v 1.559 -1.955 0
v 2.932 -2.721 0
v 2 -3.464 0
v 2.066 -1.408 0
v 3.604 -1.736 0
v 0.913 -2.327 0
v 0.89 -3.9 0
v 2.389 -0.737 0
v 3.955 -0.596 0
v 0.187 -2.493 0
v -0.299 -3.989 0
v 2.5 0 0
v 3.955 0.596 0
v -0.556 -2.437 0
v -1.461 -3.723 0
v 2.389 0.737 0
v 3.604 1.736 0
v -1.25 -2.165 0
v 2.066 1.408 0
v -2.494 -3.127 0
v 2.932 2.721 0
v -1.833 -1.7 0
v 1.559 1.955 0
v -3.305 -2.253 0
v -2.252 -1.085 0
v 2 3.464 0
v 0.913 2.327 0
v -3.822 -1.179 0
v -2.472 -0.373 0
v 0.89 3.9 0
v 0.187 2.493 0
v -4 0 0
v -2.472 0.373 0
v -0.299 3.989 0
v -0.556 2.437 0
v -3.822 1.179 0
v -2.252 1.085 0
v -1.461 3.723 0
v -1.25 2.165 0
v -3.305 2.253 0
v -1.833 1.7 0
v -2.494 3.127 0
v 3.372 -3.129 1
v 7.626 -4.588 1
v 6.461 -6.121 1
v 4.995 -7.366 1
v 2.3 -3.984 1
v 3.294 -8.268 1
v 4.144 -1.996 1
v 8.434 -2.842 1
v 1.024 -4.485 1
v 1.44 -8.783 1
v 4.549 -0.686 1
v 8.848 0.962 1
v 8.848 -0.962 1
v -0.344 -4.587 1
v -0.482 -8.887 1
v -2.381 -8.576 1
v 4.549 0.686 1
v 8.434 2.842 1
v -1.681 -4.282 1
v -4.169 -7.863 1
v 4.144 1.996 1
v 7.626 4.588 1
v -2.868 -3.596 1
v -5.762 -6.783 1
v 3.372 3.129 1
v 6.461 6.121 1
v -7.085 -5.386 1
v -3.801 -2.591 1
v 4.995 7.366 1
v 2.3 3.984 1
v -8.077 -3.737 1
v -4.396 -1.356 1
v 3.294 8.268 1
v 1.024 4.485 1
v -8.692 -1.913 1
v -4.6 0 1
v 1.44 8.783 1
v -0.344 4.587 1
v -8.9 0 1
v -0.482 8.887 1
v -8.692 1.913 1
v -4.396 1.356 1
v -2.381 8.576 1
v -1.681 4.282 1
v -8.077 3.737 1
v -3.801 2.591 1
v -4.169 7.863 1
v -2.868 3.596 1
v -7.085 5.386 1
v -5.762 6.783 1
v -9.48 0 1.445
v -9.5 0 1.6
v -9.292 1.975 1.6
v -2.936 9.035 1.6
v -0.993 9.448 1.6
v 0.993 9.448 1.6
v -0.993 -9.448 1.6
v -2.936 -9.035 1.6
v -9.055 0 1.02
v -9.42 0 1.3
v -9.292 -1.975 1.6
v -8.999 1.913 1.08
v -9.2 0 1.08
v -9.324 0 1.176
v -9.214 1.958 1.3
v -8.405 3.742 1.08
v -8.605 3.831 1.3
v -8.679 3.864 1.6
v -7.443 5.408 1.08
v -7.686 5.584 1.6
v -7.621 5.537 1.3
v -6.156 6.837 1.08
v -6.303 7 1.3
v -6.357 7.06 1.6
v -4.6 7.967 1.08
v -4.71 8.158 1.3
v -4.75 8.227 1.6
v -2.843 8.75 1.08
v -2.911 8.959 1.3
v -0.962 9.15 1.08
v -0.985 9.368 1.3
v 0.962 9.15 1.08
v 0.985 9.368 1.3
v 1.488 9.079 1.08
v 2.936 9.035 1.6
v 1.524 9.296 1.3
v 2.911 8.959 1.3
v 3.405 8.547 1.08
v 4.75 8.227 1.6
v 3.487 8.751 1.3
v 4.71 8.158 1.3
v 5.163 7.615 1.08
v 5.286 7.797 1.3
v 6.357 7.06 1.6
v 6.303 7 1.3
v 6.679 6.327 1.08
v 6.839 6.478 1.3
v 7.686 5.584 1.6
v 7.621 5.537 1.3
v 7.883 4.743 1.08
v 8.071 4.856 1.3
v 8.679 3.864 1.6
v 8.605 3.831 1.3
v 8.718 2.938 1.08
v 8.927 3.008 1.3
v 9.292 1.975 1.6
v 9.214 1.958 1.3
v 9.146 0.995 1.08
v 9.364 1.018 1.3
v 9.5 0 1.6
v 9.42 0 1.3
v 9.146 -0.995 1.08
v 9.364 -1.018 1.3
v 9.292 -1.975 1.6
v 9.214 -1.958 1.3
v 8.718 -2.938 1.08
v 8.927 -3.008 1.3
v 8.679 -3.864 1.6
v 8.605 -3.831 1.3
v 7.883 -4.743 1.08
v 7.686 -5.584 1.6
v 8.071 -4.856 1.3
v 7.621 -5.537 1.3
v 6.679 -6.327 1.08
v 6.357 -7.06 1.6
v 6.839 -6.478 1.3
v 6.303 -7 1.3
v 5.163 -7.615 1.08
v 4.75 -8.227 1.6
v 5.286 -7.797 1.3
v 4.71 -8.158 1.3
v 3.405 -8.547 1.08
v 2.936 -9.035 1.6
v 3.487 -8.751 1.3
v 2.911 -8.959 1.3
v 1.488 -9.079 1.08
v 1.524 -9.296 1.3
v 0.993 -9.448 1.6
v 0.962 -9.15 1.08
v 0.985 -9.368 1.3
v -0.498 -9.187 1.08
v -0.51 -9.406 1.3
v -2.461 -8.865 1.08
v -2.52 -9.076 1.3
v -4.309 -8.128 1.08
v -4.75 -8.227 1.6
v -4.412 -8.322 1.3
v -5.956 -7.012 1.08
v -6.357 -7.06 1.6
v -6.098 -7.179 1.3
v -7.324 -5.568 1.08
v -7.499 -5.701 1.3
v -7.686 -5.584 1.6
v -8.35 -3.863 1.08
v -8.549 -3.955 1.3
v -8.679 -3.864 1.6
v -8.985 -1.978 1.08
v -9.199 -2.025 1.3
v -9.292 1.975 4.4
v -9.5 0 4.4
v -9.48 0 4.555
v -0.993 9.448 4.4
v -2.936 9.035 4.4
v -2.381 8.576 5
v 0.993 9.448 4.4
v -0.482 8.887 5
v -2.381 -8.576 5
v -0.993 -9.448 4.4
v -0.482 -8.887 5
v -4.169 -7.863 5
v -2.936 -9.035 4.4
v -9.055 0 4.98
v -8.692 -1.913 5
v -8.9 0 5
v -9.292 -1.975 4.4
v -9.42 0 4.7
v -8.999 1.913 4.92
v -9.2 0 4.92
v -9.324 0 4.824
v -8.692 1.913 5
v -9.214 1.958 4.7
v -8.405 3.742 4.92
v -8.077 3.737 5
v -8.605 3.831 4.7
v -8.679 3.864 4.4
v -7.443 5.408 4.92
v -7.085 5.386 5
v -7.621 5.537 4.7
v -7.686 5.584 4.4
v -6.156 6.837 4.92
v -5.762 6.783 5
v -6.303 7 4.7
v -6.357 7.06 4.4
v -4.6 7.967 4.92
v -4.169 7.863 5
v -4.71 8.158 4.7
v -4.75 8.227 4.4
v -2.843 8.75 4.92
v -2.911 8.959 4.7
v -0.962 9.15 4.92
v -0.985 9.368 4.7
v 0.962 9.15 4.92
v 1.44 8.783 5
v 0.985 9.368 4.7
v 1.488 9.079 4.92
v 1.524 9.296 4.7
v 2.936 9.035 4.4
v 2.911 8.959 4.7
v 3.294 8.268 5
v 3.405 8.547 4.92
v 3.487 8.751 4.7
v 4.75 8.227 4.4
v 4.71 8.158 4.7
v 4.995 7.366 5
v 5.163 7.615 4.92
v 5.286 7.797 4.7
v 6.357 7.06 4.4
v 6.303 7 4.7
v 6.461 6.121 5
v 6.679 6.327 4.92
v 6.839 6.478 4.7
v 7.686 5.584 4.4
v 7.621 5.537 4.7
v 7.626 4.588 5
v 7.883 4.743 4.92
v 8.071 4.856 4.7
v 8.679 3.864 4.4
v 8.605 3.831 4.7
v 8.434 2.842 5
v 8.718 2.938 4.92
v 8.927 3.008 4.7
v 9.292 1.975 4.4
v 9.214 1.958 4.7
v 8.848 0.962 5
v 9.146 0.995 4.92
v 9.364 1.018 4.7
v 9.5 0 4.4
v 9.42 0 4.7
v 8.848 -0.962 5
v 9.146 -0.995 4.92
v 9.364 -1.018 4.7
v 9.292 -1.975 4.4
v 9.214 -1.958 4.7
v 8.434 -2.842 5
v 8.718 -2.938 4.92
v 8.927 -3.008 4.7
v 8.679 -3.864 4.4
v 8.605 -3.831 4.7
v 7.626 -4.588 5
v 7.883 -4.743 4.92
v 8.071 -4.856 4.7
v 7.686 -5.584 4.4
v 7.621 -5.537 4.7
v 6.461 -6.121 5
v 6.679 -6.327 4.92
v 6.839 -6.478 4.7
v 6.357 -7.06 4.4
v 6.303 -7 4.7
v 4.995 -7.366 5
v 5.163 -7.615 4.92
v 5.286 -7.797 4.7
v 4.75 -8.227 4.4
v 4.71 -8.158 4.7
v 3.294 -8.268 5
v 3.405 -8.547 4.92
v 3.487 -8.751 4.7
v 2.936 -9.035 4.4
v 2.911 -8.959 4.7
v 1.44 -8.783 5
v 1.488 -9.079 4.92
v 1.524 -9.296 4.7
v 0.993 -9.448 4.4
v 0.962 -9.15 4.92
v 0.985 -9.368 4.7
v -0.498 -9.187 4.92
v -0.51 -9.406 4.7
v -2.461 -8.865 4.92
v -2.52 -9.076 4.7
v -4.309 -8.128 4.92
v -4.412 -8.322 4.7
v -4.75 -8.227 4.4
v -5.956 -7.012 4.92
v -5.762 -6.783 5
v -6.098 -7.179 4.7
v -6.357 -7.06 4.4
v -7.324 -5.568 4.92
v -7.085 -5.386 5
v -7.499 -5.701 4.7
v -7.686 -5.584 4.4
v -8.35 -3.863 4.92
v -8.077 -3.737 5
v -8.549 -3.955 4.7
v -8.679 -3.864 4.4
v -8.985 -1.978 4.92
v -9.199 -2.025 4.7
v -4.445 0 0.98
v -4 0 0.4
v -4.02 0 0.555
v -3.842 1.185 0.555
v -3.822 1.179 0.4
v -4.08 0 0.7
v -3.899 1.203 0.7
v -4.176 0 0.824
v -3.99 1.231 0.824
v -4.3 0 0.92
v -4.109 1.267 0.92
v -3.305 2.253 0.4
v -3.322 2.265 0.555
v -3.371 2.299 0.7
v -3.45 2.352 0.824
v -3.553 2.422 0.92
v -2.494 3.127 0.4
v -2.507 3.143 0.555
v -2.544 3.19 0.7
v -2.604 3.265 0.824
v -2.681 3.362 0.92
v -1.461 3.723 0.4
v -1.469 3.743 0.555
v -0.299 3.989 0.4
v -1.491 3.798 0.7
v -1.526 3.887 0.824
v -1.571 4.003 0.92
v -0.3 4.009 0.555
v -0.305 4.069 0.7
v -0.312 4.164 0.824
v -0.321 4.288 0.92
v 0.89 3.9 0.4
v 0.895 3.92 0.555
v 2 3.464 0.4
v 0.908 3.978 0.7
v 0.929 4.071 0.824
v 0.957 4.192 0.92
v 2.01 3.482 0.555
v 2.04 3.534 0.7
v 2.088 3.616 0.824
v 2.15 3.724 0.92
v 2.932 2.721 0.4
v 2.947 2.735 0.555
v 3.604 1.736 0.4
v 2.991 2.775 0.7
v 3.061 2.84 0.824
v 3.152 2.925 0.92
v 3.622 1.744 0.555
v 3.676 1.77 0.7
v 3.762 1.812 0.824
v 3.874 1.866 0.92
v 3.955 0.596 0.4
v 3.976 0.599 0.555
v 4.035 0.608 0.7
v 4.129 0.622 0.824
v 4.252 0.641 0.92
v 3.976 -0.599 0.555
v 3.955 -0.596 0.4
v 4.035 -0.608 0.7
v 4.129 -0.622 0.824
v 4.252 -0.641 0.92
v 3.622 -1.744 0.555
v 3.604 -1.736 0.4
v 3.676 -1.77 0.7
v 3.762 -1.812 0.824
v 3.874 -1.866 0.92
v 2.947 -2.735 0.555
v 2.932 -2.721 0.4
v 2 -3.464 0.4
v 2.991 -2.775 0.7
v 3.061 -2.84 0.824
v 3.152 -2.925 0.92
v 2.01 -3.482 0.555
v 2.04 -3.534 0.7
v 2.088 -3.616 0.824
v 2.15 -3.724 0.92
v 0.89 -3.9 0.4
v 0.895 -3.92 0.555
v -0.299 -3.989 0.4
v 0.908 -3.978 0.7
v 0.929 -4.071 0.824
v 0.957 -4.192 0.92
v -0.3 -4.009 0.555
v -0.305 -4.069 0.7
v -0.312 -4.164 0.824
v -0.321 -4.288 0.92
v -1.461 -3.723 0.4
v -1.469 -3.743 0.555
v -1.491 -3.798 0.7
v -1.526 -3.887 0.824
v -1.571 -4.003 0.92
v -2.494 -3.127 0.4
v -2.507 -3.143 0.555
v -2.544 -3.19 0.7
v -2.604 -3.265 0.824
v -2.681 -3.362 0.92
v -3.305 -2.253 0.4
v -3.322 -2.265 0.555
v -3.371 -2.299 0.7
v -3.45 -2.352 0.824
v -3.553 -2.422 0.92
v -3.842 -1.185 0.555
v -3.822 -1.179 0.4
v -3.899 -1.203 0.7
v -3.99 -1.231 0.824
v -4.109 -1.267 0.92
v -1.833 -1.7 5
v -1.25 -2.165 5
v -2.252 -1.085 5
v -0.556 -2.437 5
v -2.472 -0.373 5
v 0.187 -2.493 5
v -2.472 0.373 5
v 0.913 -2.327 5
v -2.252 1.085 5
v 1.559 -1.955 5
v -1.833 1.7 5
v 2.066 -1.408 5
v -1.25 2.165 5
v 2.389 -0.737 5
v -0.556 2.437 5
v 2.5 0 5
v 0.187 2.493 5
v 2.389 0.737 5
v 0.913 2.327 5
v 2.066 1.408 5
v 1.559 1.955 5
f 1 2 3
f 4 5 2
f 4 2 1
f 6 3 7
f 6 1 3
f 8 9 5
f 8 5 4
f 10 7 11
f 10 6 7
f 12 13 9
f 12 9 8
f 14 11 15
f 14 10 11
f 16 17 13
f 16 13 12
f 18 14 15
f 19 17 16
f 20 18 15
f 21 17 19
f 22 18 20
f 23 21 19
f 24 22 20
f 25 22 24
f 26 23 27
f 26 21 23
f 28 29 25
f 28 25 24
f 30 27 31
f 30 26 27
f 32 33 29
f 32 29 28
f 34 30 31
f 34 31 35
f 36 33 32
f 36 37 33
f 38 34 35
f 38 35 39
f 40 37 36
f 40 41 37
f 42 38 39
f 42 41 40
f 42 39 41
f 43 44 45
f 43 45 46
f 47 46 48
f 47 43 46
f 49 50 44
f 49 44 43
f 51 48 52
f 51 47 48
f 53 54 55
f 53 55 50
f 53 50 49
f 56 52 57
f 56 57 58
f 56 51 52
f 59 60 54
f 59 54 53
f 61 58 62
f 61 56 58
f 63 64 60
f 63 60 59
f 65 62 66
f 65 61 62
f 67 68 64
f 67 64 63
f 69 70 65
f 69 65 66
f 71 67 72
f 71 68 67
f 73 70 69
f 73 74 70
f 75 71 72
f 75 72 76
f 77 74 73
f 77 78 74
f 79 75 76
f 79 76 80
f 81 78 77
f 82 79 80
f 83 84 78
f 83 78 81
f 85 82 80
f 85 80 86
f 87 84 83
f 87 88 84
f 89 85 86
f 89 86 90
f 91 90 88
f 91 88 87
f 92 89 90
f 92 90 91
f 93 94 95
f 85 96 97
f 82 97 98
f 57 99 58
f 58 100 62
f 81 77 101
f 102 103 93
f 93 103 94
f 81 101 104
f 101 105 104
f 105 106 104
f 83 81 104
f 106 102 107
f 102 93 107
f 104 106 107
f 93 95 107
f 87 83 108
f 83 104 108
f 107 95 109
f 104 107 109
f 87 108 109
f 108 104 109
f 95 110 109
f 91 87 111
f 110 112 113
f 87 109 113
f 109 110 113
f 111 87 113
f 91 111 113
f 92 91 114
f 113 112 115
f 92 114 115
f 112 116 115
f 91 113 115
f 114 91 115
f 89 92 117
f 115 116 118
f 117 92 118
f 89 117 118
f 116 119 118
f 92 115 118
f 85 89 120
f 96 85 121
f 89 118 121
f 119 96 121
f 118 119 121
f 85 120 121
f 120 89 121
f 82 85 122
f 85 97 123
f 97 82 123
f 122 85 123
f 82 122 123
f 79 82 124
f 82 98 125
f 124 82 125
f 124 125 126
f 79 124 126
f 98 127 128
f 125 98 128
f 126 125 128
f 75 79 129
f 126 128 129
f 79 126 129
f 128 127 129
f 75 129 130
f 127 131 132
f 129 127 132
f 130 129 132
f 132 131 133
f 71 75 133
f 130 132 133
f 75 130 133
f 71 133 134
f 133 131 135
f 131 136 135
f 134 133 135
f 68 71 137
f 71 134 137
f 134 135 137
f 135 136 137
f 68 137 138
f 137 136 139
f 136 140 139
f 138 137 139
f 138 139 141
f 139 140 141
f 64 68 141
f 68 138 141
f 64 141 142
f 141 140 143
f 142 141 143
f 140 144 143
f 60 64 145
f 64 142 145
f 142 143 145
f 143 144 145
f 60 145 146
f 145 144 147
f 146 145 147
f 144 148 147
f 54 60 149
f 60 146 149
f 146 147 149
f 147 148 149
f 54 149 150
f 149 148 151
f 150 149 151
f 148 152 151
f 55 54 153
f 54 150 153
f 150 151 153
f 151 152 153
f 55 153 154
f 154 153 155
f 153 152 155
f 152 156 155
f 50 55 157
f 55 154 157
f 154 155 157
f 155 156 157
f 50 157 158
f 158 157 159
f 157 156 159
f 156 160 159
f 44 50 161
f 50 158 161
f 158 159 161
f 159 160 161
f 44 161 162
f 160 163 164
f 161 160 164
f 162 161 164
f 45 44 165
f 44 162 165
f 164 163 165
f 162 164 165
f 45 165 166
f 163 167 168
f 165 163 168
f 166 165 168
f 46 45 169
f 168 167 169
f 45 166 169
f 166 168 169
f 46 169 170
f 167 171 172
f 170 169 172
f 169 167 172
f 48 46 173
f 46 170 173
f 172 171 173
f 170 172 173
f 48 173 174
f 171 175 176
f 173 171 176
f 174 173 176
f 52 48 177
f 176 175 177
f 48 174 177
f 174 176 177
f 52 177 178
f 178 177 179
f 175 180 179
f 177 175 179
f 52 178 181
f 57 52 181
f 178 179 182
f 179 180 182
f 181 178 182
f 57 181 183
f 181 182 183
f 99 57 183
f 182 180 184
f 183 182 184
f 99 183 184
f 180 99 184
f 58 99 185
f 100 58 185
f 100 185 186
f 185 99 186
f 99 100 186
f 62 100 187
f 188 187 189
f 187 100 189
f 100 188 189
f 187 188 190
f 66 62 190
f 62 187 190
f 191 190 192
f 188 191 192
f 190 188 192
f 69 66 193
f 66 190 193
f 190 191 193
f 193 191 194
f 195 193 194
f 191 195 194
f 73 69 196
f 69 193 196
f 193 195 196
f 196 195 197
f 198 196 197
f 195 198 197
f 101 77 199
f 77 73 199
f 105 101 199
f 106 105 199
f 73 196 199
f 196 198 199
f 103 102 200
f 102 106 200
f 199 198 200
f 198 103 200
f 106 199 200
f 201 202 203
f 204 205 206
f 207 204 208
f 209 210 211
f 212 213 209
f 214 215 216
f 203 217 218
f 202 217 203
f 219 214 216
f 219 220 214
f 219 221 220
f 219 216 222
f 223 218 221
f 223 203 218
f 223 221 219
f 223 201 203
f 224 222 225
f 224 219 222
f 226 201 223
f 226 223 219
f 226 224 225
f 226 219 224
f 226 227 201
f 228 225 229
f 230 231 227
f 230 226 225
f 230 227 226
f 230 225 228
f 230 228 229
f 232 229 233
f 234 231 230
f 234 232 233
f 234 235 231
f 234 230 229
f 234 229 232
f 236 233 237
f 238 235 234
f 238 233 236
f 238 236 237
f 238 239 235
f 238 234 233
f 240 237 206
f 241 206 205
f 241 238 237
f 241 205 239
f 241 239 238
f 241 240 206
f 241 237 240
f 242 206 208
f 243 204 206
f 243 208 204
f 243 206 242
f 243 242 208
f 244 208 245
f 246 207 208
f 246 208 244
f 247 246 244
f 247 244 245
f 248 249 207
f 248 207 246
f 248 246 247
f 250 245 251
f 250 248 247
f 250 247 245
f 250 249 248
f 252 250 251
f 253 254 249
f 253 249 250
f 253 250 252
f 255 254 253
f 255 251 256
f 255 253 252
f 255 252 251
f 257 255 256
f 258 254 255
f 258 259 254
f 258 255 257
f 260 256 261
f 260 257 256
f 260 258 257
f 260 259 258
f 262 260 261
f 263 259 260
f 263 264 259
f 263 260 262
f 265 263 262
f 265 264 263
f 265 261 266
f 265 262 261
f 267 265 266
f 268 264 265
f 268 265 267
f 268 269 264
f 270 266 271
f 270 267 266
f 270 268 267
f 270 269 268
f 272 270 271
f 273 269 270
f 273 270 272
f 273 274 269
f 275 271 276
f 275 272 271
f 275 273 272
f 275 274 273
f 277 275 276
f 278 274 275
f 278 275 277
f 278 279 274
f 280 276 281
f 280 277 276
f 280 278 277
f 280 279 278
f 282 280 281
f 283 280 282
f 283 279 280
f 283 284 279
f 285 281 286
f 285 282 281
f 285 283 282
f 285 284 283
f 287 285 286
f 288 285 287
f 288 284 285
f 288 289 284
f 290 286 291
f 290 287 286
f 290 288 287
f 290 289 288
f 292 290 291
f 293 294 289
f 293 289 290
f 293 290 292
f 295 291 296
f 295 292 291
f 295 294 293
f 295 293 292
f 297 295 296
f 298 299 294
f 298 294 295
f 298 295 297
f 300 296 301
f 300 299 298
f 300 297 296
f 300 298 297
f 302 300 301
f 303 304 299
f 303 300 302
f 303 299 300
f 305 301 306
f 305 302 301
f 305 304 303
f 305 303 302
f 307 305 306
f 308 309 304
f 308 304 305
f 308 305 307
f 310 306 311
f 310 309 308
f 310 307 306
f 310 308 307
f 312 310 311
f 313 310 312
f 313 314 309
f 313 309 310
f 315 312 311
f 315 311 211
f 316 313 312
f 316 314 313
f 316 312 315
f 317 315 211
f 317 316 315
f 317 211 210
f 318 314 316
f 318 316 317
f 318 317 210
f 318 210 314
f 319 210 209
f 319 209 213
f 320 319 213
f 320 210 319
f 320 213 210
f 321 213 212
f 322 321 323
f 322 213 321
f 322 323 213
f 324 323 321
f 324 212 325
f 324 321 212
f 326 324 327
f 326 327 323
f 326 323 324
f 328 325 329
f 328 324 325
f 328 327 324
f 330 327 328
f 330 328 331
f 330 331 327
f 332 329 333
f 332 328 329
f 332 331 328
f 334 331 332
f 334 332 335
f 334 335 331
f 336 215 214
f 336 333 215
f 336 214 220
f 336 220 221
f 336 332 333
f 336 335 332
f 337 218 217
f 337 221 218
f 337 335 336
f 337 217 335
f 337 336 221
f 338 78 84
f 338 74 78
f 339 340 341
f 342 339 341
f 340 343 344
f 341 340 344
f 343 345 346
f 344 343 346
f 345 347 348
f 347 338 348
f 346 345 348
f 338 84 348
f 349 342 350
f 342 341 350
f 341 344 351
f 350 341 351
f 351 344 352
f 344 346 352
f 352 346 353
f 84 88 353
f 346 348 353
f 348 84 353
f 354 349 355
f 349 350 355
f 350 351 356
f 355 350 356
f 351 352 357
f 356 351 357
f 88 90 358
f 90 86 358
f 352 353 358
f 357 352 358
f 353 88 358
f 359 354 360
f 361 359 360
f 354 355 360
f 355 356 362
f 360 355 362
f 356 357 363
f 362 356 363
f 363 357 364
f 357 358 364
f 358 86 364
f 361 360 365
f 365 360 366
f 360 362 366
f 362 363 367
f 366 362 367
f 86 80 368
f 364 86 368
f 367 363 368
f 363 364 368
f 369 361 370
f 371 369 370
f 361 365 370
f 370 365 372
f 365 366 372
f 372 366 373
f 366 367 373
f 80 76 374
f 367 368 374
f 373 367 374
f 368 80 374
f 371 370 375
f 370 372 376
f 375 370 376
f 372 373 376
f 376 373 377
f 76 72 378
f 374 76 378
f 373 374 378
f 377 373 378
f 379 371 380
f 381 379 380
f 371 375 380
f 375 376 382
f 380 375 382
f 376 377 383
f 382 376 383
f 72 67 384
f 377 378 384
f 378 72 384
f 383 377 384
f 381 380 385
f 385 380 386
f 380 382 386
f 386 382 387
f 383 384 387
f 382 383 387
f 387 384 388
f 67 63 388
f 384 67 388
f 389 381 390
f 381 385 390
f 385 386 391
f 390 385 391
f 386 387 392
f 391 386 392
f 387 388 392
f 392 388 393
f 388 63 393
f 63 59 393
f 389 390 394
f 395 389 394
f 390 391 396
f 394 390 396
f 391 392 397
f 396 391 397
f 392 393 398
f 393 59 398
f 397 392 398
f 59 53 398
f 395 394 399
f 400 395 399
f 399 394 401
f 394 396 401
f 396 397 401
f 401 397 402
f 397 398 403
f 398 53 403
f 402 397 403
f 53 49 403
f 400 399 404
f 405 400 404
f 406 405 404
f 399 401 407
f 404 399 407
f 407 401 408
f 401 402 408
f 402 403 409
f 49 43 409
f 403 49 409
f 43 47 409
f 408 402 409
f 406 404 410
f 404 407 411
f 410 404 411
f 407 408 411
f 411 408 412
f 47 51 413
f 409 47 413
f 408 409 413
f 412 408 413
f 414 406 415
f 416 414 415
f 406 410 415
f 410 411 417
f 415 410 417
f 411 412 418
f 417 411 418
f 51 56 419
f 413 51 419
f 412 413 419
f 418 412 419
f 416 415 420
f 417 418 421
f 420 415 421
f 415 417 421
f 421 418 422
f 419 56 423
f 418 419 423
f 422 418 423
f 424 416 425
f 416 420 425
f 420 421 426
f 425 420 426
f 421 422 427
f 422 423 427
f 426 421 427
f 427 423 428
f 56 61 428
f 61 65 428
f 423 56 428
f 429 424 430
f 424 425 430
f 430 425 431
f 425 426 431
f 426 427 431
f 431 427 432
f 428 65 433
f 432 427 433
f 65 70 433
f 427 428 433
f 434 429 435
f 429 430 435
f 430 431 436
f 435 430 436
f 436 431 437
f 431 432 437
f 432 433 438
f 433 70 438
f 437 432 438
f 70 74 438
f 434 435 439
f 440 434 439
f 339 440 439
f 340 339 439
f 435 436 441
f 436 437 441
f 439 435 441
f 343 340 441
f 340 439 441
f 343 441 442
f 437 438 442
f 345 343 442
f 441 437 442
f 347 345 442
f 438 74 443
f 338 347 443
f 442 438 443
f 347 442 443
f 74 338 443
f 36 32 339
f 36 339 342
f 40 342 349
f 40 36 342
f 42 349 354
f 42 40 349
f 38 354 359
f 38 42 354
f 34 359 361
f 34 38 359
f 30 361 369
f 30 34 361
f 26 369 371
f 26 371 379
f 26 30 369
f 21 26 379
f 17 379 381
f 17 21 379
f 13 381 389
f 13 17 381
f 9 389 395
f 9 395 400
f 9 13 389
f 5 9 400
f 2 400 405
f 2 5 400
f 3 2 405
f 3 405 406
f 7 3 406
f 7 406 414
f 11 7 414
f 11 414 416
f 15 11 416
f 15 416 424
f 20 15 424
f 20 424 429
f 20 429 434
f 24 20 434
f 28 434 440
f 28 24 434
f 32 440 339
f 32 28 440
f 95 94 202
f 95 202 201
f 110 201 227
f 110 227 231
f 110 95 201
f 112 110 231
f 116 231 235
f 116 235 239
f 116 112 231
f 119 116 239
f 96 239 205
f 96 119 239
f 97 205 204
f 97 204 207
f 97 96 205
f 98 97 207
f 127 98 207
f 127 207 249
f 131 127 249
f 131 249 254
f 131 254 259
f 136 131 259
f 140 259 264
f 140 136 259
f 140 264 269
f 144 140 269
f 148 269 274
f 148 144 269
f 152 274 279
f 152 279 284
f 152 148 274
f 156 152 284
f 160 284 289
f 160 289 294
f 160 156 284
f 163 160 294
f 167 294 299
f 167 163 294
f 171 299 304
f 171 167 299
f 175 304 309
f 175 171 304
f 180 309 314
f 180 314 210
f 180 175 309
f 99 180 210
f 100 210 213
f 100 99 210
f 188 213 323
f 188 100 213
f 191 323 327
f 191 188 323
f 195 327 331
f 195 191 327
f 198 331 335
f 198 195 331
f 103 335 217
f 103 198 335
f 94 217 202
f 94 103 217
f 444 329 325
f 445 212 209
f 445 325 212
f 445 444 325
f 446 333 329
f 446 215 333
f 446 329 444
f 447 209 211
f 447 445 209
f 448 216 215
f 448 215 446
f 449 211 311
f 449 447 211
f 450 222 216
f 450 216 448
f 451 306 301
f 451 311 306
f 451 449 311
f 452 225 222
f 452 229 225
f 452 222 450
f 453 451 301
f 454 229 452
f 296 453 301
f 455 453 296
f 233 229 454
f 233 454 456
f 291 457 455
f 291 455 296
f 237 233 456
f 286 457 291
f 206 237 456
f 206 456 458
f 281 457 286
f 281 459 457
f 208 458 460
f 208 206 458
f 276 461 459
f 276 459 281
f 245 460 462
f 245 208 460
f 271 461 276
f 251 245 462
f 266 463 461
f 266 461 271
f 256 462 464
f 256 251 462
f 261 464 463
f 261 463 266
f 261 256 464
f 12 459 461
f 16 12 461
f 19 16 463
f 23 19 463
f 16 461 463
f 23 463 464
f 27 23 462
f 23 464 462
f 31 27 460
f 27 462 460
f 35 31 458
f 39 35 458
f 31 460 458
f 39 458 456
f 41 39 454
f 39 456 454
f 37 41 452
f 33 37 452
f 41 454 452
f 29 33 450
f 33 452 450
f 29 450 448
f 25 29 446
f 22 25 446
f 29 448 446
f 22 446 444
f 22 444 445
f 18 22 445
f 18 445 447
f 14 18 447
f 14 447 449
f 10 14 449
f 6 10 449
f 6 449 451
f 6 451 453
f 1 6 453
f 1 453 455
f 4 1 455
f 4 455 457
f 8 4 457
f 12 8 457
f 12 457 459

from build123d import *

# Parameters (mm, degrees)
F2_R     = 2.5
F3_DEPTH = 11.3
F4_R     = 0.6


with BuildPart() as f1:
    # F0 (on Front) → F1 (revolve)
    with BuildSketch(Plane.XZ):
        Polygon((-4, 0), (0, 0), (0, 5), (-9.5, 5), (-9.5, 1), (-4, 1), align=None)
    revolve(axis=Axis((0, 0, 2.5), (0, 0, -1)))

    # F2 (on face) → F3 (cut)
    with BuildSketch(Plane.XY.offset(5)):
        Circle(F2_R)
    extrude(amount=-F3_DEPTH, mode=Mode.SUBTRACT)

    # F4
    f4_edges = [f1.edges().sort_by_distance(p)[0] for p in [
        (9.5, 0, 5),
        (9.5, 0, 1),
        (4, 0, 1),
    ]]
    fillet(f4_edges, radius=F4_R)


solid = f1.part
